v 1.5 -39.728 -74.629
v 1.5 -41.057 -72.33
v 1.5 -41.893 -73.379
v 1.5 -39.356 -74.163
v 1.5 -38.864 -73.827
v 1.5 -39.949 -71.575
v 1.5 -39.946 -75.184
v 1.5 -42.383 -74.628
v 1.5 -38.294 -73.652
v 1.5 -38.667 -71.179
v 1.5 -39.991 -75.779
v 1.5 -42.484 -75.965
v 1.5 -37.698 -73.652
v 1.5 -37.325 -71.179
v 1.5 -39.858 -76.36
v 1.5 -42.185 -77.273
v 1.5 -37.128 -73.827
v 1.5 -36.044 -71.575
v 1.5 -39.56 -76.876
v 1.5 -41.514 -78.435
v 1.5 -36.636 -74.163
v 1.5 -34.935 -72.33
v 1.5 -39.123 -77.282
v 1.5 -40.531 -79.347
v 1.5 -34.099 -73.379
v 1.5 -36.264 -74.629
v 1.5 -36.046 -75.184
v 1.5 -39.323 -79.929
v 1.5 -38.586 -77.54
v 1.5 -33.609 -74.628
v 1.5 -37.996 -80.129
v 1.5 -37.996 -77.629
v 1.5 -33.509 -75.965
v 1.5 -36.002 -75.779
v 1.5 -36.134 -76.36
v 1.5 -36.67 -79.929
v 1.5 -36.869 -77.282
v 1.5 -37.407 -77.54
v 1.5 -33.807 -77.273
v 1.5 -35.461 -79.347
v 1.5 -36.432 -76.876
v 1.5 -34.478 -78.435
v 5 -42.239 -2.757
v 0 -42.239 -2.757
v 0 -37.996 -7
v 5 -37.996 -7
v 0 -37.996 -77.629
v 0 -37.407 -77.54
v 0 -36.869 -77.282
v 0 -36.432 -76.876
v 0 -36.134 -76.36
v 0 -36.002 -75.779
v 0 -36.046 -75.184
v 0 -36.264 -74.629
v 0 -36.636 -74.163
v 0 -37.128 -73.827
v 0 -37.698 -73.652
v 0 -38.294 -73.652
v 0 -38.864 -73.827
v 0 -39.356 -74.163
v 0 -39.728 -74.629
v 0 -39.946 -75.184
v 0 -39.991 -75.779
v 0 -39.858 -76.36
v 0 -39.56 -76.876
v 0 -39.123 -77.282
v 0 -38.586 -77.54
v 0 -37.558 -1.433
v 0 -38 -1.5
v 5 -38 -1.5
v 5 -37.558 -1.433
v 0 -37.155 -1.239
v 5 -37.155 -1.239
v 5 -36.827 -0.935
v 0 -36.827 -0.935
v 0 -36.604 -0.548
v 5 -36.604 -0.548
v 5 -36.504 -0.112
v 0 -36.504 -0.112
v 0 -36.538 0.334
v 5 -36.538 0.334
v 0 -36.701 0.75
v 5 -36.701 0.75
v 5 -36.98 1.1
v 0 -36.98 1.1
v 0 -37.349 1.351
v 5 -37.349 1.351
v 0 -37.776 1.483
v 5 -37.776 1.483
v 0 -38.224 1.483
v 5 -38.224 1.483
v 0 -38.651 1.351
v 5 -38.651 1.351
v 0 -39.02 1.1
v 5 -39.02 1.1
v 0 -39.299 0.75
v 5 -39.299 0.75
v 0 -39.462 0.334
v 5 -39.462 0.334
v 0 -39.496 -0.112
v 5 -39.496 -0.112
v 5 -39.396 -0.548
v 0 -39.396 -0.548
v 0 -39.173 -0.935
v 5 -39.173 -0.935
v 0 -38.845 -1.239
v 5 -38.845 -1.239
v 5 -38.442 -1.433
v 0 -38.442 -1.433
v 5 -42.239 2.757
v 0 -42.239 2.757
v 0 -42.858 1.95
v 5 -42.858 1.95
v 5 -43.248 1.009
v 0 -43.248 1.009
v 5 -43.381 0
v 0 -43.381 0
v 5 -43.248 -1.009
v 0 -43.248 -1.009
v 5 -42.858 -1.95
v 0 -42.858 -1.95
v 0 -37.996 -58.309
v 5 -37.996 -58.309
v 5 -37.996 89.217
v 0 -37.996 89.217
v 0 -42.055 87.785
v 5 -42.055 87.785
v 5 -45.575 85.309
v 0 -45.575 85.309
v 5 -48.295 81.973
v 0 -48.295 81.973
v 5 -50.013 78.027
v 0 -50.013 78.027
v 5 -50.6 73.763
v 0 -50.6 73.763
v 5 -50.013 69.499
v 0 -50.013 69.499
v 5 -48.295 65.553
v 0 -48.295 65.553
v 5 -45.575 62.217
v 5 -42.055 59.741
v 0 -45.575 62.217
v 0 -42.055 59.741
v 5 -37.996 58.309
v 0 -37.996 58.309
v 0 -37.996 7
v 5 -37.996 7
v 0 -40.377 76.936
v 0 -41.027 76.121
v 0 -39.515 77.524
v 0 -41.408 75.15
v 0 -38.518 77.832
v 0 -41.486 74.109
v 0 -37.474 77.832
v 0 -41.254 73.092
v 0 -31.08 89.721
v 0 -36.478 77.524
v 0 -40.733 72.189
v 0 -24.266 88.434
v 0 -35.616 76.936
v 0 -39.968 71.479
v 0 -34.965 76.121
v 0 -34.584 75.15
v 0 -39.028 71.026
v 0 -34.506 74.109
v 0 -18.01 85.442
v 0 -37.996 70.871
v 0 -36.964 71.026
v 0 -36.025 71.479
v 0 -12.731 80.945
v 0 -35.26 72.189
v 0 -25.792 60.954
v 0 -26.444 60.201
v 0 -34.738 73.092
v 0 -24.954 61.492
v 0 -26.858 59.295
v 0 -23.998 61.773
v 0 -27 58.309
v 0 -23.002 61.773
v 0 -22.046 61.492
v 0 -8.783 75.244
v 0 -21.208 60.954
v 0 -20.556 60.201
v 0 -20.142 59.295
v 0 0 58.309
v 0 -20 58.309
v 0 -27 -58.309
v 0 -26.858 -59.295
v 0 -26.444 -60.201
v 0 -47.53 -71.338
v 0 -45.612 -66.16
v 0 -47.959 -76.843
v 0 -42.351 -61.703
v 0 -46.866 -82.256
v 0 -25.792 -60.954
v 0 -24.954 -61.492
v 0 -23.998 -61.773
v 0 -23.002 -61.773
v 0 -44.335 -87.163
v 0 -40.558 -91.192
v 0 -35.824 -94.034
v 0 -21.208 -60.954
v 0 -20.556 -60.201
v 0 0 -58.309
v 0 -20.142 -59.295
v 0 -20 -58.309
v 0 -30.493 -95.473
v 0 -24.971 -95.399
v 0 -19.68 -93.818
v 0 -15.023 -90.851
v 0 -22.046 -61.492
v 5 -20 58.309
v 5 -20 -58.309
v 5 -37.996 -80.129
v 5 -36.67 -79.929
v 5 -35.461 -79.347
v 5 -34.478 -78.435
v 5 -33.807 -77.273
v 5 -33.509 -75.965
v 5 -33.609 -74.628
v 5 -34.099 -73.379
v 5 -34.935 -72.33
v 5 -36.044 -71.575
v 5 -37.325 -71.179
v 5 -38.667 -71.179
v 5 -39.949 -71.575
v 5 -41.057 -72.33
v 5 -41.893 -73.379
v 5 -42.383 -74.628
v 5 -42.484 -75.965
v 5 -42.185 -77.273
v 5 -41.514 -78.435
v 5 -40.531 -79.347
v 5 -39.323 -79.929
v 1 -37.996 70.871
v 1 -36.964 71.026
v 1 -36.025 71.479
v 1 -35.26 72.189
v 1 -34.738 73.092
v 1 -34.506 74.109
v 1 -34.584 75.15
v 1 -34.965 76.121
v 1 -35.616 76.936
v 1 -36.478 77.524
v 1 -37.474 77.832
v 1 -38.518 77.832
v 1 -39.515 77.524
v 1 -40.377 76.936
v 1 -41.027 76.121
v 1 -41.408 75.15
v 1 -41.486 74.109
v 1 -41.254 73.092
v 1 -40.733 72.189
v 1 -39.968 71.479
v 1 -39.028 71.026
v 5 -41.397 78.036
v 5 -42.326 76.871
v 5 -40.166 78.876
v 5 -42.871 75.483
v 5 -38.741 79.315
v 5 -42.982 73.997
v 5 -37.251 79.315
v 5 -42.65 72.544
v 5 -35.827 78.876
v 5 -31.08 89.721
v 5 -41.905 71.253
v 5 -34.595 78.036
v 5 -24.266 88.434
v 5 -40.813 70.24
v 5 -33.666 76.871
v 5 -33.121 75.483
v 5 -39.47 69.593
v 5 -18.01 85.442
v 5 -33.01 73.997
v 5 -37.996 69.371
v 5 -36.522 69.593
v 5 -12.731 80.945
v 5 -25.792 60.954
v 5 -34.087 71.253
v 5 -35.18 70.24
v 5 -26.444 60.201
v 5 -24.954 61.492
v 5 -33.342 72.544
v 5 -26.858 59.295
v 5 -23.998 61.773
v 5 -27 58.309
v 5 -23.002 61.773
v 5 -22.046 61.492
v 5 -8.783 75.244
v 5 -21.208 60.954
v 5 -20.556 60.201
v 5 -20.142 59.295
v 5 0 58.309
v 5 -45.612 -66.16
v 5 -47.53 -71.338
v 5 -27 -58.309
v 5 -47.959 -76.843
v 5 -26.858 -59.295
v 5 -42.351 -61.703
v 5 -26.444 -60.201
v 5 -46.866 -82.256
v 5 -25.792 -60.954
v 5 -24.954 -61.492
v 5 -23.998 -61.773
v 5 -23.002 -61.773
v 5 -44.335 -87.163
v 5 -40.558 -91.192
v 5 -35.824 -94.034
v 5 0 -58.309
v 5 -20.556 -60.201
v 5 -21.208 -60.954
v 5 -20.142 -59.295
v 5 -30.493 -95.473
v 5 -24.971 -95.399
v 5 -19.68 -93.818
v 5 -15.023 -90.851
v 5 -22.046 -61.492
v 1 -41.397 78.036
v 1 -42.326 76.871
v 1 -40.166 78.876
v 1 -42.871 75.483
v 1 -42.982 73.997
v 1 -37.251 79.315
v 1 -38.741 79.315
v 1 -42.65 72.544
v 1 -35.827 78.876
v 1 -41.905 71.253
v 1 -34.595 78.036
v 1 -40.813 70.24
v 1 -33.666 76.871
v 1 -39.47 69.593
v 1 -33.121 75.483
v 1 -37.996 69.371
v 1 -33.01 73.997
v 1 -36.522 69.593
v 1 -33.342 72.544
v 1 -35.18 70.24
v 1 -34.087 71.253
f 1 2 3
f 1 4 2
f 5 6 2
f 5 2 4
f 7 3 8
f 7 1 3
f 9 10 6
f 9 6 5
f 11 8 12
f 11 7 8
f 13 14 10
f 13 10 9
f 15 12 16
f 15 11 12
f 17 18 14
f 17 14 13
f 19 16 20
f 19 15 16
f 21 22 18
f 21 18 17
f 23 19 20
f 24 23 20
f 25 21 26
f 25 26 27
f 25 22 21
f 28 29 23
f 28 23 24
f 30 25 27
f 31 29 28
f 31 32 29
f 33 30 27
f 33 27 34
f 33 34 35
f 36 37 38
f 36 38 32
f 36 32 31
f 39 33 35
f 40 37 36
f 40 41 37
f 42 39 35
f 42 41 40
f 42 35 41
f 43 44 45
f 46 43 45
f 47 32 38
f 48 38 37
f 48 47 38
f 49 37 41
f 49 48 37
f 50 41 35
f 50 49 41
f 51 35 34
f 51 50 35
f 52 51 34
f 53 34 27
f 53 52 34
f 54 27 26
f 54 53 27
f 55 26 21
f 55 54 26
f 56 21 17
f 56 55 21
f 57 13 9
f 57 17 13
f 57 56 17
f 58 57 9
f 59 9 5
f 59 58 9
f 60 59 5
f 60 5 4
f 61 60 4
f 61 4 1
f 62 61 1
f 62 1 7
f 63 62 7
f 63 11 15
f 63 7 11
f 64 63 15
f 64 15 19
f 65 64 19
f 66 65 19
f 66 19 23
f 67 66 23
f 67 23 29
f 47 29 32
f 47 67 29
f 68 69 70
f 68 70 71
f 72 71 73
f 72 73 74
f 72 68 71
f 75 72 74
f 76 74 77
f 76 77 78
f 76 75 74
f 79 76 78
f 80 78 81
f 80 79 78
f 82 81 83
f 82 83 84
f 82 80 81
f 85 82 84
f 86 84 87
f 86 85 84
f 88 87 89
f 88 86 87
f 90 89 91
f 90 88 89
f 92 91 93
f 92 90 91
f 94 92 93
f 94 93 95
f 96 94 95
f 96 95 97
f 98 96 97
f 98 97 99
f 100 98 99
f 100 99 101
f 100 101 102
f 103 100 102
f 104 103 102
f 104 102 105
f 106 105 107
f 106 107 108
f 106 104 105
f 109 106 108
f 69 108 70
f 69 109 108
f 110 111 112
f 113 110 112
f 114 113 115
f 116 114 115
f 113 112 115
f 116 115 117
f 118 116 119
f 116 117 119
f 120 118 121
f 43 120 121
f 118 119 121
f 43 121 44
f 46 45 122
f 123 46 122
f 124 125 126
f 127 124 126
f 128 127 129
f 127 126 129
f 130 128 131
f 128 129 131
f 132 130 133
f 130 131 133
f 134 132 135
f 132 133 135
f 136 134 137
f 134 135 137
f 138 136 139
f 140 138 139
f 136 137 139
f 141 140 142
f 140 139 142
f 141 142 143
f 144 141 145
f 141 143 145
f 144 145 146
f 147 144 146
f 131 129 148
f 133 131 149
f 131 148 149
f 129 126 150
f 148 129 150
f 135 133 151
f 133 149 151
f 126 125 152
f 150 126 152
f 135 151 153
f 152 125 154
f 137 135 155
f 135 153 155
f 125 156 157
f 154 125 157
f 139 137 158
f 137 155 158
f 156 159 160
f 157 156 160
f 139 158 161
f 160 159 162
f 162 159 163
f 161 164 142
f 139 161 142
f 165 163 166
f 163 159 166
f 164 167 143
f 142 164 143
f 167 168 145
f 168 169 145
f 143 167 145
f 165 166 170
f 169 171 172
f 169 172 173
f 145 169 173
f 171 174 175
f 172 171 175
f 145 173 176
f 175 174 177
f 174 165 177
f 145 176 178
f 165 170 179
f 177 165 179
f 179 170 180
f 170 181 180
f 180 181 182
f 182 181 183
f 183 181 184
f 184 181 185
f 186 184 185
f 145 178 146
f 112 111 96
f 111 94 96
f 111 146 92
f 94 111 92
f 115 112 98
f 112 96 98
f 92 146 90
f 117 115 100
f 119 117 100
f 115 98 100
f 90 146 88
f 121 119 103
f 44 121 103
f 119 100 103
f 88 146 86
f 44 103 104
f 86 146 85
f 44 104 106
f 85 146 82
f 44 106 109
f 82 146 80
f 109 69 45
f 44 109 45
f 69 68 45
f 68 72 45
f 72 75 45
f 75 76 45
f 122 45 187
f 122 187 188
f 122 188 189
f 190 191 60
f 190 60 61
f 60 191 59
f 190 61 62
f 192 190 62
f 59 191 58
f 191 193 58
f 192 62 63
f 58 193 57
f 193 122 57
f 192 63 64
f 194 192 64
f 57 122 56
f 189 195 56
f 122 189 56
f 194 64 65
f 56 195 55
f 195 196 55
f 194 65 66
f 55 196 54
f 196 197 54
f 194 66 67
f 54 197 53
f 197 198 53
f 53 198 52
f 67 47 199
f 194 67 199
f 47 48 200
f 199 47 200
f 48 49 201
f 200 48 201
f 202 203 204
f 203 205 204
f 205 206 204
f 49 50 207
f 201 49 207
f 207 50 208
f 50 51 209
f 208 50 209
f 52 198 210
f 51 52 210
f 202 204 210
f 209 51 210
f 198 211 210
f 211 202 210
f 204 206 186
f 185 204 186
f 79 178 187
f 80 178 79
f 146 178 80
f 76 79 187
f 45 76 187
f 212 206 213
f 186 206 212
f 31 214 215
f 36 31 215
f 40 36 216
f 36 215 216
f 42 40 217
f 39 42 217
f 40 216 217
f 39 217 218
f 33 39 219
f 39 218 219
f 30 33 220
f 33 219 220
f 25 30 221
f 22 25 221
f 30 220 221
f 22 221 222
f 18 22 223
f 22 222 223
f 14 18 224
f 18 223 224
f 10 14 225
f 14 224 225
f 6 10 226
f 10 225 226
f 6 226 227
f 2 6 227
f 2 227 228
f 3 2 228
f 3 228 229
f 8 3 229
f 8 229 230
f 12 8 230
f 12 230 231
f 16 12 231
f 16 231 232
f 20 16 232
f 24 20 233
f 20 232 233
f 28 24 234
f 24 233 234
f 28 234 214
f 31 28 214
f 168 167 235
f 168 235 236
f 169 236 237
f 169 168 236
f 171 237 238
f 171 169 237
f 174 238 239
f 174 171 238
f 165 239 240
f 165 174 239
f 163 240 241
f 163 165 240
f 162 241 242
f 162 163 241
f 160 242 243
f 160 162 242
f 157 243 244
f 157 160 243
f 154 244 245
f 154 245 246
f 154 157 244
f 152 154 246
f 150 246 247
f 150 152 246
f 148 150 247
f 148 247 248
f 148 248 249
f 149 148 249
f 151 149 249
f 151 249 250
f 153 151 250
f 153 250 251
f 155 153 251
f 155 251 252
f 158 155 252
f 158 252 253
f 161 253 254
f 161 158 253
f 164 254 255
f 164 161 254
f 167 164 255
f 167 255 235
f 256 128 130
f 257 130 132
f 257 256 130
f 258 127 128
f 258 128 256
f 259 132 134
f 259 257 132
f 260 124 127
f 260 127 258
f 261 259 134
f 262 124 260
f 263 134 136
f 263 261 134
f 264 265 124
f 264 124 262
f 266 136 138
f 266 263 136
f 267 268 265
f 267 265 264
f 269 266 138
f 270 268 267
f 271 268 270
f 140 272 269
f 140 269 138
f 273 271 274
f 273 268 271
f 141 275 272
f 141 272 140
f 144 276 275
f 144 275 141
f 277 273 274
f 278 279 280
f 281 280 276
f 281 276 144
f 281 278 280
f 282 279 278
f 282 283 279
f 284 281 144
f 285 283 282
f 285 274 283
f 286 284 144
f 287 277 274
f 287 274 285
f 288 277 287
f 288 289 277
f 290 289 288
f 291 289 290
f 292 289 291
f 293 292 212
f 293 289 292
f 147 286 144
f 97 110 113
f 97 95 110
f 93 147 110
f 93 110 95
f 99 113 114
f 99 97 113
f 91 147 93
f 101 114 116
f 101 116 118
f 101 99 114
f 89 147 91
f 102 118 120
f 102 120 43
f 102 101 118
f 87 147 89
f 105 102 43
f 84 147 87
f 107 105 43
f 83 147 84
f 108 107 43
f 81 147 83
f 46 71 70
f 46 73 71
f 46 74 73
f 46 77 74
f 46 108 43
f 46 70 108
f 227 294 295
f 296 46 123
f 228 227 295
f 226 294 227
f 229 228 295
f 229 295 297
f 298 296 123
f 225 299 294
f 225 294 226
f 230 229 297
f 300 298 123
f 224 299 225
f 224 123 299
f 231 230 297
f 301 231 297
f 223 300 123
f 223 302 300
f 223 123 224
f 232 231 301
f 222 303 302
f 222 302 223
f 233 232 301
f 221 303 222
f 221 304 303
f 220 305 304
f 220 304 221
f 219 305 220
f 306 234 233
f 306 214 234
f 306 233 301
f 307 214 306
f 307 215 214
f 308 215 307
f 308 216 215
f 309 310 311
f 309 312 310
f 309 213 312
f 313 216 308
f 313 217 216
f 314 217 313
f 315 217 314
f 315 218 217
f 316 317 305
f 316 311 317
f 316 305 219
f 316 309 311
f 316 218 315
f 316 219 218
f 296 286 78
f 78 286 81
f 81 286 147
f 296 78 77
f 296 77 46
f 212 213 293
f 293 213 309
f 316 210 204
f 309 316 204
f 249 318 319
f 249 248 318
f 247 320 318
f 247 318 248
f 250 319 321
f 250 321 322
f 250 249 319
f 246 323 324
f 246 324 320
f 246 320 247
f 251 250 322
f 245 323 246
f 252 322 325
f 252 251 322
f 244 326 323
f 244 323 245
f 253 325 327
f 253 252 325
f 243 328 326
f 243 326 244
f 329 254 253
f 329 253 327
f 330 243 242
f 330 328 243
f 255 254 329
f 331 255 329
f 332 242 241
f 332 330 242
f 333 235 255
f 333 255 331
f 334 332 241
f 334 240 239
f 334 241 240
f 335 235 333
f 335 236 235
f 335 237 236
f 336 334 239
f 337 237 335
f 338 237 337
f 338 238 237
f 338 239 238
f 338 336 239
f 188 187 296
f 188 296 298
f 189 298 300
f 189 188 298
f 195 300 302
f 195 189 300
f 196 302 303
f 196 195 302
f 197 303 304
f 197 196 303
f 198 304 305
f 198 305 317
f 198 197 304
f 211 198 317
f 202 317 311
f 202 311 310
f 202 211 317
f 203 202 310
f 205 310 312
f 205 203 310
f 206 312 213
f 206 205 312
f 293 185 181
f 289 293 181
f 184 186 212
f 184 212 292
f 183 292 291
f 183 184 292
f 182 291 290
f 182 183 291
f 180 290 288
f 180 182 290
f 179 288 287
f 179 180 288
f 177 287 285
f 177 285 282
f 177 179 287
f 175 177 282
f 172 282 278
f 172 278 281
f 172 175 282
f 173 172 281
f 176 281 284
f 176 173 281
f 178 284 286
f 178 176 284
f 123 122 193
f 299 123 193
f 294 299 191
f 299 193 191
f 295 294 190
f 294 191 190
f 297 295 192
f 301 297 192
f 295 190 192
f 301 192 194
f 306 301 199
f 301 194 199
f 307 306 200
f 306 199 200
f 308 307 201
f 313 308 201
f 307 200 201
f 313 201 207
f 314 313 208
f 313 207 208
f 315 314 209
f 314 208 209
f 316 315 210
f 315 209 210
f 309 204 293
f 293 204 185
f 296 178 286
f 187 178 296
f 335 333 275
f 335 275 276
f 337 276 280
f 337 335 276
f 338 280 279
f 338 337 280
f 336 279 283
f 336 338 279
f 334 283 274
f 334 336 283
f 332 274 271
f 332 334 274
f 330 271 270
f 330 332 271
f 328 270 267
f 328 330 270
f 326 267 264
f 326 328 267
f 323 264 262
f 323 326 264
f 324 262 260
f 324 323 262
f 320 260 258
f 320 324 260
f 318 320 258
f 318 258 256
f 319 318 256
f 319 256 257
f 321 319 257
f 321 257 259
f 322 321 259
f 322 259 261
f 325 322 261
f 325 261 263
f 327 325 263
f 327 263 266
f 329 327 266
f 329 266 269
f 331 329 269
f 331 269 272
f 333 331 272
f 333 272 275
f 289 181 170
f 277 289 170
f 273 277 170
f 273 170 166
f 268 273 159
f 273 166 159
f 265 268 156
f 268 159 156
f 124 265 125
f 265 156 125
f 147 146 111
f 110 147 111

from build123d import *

# Parameters (mm, degrees)
SKETCH2_R           = 5
SKETCH2_R_2         = 2
SKETCH2_R_3         = 1.5
BOSS_EXTRUDE1_DEPTH = 5
SKETCH3_R           = 4.5
CUT_EXTRUDE1_DEPTH  = 3.5
BOSS_EXTRUDE2_START = -5
SKETCH4_R           = 5
SKETCH4_R_2         = 3.5
BOSS_EXTRUDE2_DEPTH = 1


with BuildPart() as part:
    # Sketch2 → Boss-Extrude1 (new body)
    with BuildSketch(Plane(origin=(0, 0, 0), x_dir=(0, 0, -1), z_dir=(1, 0, 0))):
        with BuildLine():
            Line((58.308676511, 0), (-58.308676511, 0))
            Line((-58.308676511, 0), (-75.243665272, -8.783179062))
            ThreePointArc((-75.243665272, -8.783179062), (-87.141316573, -21.040619401), (-89.217284989, -37.996128985))
            ThreePointArc((-89.217284989, -37.996128985), (-73.76298075, -50.59971931), (-58.308676511, -37.996128985))
            Line((-58.308676511, -37.996128985), (-7, -37.996128985))
            Line((-7, -37.996128985), (-2.757359313, -42.238769672))
            ThreePointArc((-2.757359313, -42.238769672), (0, -43.380905296), (2.757359313, -42.238769672))
            Line((2.757359313, -42.238769672), (7, -37.996128985))
            Line((7, -37.996128985), (58.308676511, -37.996128985))
            ThreePointArc((58.308676511, -37.996128985), (87.163327852, -44.335147902), (90.85122644, -15.023486932))
            Line((90.85122644, -15.023486932), (58.308676511, 0))
        make_face()
        with Locations((-74.370815413, -37.996128985)):
            Circle(SKETCH2_R, mode=Mode.SUBTRACT)
        with Locations((75.629184587, -37.996128985)):
            Circle(SKETCH2_R_2, mode=Mode.SUBTRACT)
        with Locations((0, -38)):
            Circle(SKETCH2_R_3, mode=Mode.SUBTRACT)
        with BuildLine():
            Line((-58.308676511, -27), (58.308676511, -27))
            ThreePointArc((58.308676511, -27), (61.808676511, -23.5), (58.308676511, -20))
            Line((58.308676511, -20), (-58.308676511, -20))
            ThreePointArc((-58.308676511, -20), (-61.808676511, -23.5), (-58.308676511, -27))
        make_face(mode=Mode.SUBTRACT)
    extrude(amount=BOSS_EXTRUDE1_DEPTH)

    # Sketch3 → Cut-Extrude1 (cut)
    with BuildSketch(Plane(origin=(5, 0, 0), x_dir=(0, 0, -1), z_dir=(1, 0, 0))):
        with Locations((75.629184587, -37.996128985)):
            Circle(SKETCH3_R)
    extrude(amount=-CUT_EXTRUDE1_DEPTH, mode=Mode.SUBTRACT)

    # Sketch4 → Boss-Extrude2 (add)
    with BuildSketch(Plane(origin=(5, 0, 0), x_dir=(0, 0, -1), z_dir=(1, 0, 0)).offset(BOSS_EXTRUDE2_START)):
        with Locations((-74.370815413, -37.996128985)):
            Circle(SKETCH4_R)
        with Locations((-74.370815413, -37.996128985)):
            Circle(SKETCH4_R_2, mode=Mode.SUBTRACT)
    extrude(amount=BOSS_EXTRUDE2_DEPTH)


solid = part.part
